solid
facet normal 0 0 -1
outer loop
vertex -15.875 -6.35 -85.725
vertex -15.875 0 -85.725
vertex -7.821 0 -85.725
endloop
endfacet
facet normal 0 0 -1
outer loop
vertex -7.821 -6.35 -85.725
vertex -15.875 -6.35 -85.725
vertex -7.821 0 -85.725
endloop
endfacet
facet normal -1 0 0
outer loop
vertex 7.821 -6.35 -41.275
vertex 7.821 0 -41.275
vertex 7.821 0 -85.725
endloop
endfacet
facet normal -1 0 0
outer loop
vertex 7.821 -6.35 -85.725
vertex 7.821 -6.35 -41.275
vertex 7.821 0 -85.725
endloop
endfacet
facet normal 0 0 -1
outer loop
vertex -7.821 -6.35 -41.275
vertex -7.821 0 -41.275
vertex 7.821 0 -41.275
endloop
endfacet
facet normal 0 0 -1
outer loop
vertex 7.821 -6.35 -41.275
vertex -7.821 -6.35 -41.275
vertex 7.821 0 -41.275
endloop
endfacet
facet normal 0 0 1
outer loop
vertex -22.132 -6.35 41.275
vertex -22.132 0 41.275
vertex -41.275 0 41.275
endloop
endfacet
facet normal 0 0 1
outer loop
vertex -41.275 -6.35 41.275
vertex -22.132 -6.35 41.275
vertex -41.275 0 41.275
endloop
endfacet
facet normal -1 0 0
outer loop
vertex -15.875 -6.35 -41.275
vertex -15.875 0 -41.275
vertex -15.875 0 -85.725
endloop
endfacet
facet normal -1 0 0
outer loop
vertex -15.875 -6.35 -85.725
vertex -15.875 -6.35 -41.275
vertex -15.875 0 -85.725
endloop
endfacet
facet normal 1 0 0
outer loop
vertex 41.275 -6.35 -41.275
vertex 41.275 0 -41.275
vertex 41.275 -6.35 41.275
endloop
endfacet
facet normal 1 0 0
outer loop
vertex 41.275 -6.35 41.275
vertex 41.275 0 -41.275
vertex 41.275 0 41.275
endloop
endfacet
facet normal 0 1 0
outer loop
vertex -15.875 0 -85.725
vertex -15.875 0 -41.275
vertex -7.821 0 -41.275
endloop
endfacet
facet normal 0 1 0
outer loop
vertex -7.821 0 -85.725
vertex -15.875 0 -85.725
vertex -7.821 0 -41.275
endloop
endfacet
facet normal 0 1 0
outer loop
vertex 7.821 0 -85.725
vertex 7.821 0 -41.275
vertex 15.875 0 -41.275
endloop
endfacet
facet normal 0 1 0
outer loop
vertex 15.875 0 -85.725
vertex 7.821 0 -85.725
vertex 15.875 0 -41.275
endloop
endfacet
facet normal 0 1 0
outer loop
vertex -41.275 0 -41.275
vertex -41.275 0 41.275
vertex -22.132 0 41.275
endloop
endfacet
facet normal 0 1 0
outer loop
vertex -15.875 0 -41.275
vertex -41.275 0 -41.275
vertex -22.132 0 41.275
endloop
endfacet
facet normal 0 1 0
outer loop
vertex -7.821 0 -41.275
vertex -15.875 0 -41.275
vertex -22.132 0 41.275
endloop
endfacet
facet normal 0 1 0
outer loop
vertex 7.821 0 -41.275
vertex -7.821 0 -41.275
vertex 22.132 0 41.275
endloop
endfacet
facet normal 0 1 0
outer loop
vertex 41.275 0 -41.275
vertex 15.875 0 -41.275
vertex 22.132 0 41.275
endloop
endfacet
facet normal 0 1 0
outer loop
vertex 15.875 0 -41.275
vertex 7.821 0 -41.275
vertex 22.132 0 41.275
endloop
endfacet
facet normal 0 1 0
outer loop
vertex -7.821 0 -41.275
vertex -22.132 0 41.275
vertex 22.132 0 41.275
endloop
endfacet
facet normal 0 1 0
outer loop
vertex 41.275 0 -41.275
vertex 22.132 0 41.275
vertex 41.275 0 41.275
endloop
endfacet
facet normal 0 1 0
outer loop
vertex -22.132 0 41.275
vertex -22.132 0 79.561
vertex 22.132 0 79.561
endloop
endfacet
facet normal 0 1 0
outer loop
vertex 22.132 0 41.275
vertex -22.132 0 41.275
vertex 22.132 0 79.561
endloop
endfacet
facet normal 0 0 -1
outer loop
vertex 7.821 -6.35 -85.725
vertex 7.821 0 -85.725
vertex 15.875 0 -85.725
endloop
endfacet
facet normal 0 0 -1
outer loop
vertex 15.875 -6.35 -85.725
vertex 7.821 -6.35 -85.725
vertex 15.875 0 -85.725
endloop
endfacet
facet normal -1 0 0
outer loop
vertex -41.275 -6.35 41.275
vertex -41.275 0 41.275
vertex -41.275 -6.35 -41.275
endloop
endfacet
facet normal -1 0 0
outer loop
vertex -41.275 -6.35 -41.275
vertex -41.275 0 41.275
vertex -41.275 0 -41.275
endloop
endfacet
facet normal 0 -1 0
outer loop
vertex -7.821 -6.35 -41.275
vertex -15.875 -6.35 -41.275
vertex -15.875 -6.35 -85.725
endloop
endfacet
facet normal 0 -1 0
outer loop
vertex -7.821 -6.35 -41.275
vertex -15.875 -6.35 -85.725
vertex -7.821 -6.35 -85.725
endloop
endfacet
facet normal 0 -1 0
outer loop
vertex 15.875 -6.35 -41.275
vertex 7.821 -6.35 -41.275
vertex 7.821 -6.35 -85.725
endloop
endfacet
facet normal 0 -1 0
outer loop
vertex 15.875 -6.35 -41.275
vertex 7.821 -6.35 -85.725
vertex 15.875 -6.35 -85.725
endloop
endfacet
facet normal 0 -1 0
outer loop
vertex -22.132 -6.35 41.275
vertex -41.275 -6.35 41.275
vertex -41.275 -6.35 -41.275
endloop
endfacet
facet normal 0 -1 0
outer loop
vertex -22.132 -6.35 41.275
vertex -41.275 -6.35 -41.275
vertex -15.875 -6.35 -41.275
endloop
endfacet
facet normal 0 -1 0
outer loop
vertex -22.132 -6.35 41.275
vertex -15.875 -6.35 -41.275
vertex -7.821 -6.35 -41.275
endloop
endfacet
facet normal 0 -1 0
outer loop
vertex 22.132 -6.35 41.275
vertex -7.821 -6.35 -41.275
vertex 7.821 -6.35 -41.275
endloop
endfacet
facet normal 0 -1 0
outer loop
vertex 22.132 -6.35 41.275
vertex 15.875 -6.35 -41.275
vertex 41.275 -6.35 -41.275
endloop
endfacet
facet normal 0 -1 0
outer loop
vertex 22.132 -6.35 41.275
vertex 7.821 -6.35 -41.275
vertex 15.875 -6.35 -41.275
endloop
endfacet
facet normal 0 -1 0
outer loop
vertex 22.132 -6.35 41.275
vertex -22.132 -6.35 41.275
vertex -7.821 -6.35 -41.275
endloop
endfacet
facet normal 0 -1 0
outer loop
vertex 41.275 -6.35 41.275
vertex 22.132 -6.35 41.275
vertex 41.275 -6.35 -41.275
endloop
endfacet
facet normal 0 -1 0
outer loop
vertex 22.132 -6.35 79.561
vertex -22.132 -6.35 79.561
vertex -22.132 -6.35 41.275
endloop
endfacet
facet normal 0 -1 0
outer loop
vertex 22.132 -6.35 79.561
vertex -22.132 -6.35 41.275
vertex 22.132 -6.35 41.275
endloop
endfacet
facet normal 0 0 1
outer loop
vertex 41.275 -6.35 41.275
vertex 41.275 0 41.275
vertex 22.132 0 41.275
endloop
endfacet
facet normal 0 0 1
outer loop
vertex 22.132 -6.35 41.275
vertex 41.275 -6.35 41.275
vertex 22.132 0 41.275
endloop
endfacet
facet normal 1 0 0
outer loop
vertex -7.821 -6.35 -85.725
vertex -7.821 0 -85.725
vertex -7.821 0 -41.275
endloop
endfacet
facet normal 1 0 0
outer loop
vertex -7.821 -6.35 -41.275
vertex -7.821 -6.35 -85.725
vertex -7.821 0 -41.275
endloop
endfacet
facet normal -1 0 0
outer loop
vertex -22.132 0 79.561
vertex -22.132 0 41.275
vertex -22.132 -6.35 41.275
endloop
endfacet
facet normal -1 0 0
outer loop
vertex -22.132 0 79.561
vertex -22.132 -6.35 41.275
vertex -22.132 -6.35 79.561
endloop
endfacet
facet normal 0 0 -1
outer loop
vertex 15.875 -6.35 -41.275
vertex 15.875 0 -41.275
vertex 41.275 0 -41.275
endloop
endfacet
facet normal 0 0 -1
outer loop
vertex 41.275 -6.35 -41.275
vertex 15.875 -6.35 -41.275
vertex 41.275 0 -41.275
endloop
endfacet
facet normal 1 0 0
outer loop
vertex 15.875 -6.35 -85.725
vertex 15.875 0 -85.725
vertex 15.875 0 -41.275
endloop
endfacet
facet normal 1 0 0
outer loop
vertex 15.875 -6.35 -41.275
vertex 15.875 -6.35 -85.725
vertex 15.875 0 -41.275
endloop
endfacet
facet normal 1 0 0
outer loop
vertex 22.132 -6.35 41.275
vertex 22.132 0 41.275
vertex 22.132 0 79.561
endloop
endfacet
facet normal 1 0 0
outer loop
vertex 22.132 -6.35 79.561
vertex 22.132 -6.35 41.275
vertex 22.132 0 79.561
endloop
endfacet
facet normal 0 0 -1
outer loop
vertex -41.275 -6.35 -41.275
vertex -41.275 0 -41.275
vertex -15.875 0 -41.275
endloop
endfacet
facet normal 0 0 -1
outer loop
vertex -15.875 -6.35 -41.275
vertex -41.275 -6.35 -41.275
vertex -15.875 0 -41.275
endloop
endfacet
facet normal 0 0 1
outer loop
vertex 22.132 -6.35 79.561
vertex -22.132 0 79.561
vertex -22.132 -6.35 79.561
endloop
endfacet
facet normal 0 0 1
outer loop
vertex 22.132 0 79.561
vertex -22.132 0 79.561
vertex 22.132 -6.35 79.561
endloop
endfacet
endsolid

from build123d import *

# Parameters (mm, degrees)
F0_W     = 44.2640645027
F0_H     = 38.2859354973
F1_DEPTH = 6.35


with BuildPart() as f1:
    # F0 (on Front) → F1 (new body)
    with BuildSketch(Plane.XZ):
        Polygon((41.275, -41.275), (41.275, 41.275), (22.1320322514, 41.275), (-22.1320322514, 41.275), (-41.275, 41.275), (-41.275, -41.275), (-15.875, -41.275), (-7.8206129843, -41.275), (7.8206129843, -41.275), (15.875, -41.275), align=None)
        with Locations((0, 60.4179677486)):
            Rectangle(F0_W, F0_H)
        Polygon((15.875, -85.725), (15.875, -41.275), (7.8206129843, -41.275), (7.8206129843, -85.5907460871), (7.8206129843, -85.725), align=None)
        Polygon((-7.8206129843, -85.5907460871), (-7.8206129843, -41.275), (-15.875, -41.275), (-15.875, -85.725), (-7.8206129843, -85.725), align=None)
    extrude(amount=F1_DEPTH)


solid = f1.part
